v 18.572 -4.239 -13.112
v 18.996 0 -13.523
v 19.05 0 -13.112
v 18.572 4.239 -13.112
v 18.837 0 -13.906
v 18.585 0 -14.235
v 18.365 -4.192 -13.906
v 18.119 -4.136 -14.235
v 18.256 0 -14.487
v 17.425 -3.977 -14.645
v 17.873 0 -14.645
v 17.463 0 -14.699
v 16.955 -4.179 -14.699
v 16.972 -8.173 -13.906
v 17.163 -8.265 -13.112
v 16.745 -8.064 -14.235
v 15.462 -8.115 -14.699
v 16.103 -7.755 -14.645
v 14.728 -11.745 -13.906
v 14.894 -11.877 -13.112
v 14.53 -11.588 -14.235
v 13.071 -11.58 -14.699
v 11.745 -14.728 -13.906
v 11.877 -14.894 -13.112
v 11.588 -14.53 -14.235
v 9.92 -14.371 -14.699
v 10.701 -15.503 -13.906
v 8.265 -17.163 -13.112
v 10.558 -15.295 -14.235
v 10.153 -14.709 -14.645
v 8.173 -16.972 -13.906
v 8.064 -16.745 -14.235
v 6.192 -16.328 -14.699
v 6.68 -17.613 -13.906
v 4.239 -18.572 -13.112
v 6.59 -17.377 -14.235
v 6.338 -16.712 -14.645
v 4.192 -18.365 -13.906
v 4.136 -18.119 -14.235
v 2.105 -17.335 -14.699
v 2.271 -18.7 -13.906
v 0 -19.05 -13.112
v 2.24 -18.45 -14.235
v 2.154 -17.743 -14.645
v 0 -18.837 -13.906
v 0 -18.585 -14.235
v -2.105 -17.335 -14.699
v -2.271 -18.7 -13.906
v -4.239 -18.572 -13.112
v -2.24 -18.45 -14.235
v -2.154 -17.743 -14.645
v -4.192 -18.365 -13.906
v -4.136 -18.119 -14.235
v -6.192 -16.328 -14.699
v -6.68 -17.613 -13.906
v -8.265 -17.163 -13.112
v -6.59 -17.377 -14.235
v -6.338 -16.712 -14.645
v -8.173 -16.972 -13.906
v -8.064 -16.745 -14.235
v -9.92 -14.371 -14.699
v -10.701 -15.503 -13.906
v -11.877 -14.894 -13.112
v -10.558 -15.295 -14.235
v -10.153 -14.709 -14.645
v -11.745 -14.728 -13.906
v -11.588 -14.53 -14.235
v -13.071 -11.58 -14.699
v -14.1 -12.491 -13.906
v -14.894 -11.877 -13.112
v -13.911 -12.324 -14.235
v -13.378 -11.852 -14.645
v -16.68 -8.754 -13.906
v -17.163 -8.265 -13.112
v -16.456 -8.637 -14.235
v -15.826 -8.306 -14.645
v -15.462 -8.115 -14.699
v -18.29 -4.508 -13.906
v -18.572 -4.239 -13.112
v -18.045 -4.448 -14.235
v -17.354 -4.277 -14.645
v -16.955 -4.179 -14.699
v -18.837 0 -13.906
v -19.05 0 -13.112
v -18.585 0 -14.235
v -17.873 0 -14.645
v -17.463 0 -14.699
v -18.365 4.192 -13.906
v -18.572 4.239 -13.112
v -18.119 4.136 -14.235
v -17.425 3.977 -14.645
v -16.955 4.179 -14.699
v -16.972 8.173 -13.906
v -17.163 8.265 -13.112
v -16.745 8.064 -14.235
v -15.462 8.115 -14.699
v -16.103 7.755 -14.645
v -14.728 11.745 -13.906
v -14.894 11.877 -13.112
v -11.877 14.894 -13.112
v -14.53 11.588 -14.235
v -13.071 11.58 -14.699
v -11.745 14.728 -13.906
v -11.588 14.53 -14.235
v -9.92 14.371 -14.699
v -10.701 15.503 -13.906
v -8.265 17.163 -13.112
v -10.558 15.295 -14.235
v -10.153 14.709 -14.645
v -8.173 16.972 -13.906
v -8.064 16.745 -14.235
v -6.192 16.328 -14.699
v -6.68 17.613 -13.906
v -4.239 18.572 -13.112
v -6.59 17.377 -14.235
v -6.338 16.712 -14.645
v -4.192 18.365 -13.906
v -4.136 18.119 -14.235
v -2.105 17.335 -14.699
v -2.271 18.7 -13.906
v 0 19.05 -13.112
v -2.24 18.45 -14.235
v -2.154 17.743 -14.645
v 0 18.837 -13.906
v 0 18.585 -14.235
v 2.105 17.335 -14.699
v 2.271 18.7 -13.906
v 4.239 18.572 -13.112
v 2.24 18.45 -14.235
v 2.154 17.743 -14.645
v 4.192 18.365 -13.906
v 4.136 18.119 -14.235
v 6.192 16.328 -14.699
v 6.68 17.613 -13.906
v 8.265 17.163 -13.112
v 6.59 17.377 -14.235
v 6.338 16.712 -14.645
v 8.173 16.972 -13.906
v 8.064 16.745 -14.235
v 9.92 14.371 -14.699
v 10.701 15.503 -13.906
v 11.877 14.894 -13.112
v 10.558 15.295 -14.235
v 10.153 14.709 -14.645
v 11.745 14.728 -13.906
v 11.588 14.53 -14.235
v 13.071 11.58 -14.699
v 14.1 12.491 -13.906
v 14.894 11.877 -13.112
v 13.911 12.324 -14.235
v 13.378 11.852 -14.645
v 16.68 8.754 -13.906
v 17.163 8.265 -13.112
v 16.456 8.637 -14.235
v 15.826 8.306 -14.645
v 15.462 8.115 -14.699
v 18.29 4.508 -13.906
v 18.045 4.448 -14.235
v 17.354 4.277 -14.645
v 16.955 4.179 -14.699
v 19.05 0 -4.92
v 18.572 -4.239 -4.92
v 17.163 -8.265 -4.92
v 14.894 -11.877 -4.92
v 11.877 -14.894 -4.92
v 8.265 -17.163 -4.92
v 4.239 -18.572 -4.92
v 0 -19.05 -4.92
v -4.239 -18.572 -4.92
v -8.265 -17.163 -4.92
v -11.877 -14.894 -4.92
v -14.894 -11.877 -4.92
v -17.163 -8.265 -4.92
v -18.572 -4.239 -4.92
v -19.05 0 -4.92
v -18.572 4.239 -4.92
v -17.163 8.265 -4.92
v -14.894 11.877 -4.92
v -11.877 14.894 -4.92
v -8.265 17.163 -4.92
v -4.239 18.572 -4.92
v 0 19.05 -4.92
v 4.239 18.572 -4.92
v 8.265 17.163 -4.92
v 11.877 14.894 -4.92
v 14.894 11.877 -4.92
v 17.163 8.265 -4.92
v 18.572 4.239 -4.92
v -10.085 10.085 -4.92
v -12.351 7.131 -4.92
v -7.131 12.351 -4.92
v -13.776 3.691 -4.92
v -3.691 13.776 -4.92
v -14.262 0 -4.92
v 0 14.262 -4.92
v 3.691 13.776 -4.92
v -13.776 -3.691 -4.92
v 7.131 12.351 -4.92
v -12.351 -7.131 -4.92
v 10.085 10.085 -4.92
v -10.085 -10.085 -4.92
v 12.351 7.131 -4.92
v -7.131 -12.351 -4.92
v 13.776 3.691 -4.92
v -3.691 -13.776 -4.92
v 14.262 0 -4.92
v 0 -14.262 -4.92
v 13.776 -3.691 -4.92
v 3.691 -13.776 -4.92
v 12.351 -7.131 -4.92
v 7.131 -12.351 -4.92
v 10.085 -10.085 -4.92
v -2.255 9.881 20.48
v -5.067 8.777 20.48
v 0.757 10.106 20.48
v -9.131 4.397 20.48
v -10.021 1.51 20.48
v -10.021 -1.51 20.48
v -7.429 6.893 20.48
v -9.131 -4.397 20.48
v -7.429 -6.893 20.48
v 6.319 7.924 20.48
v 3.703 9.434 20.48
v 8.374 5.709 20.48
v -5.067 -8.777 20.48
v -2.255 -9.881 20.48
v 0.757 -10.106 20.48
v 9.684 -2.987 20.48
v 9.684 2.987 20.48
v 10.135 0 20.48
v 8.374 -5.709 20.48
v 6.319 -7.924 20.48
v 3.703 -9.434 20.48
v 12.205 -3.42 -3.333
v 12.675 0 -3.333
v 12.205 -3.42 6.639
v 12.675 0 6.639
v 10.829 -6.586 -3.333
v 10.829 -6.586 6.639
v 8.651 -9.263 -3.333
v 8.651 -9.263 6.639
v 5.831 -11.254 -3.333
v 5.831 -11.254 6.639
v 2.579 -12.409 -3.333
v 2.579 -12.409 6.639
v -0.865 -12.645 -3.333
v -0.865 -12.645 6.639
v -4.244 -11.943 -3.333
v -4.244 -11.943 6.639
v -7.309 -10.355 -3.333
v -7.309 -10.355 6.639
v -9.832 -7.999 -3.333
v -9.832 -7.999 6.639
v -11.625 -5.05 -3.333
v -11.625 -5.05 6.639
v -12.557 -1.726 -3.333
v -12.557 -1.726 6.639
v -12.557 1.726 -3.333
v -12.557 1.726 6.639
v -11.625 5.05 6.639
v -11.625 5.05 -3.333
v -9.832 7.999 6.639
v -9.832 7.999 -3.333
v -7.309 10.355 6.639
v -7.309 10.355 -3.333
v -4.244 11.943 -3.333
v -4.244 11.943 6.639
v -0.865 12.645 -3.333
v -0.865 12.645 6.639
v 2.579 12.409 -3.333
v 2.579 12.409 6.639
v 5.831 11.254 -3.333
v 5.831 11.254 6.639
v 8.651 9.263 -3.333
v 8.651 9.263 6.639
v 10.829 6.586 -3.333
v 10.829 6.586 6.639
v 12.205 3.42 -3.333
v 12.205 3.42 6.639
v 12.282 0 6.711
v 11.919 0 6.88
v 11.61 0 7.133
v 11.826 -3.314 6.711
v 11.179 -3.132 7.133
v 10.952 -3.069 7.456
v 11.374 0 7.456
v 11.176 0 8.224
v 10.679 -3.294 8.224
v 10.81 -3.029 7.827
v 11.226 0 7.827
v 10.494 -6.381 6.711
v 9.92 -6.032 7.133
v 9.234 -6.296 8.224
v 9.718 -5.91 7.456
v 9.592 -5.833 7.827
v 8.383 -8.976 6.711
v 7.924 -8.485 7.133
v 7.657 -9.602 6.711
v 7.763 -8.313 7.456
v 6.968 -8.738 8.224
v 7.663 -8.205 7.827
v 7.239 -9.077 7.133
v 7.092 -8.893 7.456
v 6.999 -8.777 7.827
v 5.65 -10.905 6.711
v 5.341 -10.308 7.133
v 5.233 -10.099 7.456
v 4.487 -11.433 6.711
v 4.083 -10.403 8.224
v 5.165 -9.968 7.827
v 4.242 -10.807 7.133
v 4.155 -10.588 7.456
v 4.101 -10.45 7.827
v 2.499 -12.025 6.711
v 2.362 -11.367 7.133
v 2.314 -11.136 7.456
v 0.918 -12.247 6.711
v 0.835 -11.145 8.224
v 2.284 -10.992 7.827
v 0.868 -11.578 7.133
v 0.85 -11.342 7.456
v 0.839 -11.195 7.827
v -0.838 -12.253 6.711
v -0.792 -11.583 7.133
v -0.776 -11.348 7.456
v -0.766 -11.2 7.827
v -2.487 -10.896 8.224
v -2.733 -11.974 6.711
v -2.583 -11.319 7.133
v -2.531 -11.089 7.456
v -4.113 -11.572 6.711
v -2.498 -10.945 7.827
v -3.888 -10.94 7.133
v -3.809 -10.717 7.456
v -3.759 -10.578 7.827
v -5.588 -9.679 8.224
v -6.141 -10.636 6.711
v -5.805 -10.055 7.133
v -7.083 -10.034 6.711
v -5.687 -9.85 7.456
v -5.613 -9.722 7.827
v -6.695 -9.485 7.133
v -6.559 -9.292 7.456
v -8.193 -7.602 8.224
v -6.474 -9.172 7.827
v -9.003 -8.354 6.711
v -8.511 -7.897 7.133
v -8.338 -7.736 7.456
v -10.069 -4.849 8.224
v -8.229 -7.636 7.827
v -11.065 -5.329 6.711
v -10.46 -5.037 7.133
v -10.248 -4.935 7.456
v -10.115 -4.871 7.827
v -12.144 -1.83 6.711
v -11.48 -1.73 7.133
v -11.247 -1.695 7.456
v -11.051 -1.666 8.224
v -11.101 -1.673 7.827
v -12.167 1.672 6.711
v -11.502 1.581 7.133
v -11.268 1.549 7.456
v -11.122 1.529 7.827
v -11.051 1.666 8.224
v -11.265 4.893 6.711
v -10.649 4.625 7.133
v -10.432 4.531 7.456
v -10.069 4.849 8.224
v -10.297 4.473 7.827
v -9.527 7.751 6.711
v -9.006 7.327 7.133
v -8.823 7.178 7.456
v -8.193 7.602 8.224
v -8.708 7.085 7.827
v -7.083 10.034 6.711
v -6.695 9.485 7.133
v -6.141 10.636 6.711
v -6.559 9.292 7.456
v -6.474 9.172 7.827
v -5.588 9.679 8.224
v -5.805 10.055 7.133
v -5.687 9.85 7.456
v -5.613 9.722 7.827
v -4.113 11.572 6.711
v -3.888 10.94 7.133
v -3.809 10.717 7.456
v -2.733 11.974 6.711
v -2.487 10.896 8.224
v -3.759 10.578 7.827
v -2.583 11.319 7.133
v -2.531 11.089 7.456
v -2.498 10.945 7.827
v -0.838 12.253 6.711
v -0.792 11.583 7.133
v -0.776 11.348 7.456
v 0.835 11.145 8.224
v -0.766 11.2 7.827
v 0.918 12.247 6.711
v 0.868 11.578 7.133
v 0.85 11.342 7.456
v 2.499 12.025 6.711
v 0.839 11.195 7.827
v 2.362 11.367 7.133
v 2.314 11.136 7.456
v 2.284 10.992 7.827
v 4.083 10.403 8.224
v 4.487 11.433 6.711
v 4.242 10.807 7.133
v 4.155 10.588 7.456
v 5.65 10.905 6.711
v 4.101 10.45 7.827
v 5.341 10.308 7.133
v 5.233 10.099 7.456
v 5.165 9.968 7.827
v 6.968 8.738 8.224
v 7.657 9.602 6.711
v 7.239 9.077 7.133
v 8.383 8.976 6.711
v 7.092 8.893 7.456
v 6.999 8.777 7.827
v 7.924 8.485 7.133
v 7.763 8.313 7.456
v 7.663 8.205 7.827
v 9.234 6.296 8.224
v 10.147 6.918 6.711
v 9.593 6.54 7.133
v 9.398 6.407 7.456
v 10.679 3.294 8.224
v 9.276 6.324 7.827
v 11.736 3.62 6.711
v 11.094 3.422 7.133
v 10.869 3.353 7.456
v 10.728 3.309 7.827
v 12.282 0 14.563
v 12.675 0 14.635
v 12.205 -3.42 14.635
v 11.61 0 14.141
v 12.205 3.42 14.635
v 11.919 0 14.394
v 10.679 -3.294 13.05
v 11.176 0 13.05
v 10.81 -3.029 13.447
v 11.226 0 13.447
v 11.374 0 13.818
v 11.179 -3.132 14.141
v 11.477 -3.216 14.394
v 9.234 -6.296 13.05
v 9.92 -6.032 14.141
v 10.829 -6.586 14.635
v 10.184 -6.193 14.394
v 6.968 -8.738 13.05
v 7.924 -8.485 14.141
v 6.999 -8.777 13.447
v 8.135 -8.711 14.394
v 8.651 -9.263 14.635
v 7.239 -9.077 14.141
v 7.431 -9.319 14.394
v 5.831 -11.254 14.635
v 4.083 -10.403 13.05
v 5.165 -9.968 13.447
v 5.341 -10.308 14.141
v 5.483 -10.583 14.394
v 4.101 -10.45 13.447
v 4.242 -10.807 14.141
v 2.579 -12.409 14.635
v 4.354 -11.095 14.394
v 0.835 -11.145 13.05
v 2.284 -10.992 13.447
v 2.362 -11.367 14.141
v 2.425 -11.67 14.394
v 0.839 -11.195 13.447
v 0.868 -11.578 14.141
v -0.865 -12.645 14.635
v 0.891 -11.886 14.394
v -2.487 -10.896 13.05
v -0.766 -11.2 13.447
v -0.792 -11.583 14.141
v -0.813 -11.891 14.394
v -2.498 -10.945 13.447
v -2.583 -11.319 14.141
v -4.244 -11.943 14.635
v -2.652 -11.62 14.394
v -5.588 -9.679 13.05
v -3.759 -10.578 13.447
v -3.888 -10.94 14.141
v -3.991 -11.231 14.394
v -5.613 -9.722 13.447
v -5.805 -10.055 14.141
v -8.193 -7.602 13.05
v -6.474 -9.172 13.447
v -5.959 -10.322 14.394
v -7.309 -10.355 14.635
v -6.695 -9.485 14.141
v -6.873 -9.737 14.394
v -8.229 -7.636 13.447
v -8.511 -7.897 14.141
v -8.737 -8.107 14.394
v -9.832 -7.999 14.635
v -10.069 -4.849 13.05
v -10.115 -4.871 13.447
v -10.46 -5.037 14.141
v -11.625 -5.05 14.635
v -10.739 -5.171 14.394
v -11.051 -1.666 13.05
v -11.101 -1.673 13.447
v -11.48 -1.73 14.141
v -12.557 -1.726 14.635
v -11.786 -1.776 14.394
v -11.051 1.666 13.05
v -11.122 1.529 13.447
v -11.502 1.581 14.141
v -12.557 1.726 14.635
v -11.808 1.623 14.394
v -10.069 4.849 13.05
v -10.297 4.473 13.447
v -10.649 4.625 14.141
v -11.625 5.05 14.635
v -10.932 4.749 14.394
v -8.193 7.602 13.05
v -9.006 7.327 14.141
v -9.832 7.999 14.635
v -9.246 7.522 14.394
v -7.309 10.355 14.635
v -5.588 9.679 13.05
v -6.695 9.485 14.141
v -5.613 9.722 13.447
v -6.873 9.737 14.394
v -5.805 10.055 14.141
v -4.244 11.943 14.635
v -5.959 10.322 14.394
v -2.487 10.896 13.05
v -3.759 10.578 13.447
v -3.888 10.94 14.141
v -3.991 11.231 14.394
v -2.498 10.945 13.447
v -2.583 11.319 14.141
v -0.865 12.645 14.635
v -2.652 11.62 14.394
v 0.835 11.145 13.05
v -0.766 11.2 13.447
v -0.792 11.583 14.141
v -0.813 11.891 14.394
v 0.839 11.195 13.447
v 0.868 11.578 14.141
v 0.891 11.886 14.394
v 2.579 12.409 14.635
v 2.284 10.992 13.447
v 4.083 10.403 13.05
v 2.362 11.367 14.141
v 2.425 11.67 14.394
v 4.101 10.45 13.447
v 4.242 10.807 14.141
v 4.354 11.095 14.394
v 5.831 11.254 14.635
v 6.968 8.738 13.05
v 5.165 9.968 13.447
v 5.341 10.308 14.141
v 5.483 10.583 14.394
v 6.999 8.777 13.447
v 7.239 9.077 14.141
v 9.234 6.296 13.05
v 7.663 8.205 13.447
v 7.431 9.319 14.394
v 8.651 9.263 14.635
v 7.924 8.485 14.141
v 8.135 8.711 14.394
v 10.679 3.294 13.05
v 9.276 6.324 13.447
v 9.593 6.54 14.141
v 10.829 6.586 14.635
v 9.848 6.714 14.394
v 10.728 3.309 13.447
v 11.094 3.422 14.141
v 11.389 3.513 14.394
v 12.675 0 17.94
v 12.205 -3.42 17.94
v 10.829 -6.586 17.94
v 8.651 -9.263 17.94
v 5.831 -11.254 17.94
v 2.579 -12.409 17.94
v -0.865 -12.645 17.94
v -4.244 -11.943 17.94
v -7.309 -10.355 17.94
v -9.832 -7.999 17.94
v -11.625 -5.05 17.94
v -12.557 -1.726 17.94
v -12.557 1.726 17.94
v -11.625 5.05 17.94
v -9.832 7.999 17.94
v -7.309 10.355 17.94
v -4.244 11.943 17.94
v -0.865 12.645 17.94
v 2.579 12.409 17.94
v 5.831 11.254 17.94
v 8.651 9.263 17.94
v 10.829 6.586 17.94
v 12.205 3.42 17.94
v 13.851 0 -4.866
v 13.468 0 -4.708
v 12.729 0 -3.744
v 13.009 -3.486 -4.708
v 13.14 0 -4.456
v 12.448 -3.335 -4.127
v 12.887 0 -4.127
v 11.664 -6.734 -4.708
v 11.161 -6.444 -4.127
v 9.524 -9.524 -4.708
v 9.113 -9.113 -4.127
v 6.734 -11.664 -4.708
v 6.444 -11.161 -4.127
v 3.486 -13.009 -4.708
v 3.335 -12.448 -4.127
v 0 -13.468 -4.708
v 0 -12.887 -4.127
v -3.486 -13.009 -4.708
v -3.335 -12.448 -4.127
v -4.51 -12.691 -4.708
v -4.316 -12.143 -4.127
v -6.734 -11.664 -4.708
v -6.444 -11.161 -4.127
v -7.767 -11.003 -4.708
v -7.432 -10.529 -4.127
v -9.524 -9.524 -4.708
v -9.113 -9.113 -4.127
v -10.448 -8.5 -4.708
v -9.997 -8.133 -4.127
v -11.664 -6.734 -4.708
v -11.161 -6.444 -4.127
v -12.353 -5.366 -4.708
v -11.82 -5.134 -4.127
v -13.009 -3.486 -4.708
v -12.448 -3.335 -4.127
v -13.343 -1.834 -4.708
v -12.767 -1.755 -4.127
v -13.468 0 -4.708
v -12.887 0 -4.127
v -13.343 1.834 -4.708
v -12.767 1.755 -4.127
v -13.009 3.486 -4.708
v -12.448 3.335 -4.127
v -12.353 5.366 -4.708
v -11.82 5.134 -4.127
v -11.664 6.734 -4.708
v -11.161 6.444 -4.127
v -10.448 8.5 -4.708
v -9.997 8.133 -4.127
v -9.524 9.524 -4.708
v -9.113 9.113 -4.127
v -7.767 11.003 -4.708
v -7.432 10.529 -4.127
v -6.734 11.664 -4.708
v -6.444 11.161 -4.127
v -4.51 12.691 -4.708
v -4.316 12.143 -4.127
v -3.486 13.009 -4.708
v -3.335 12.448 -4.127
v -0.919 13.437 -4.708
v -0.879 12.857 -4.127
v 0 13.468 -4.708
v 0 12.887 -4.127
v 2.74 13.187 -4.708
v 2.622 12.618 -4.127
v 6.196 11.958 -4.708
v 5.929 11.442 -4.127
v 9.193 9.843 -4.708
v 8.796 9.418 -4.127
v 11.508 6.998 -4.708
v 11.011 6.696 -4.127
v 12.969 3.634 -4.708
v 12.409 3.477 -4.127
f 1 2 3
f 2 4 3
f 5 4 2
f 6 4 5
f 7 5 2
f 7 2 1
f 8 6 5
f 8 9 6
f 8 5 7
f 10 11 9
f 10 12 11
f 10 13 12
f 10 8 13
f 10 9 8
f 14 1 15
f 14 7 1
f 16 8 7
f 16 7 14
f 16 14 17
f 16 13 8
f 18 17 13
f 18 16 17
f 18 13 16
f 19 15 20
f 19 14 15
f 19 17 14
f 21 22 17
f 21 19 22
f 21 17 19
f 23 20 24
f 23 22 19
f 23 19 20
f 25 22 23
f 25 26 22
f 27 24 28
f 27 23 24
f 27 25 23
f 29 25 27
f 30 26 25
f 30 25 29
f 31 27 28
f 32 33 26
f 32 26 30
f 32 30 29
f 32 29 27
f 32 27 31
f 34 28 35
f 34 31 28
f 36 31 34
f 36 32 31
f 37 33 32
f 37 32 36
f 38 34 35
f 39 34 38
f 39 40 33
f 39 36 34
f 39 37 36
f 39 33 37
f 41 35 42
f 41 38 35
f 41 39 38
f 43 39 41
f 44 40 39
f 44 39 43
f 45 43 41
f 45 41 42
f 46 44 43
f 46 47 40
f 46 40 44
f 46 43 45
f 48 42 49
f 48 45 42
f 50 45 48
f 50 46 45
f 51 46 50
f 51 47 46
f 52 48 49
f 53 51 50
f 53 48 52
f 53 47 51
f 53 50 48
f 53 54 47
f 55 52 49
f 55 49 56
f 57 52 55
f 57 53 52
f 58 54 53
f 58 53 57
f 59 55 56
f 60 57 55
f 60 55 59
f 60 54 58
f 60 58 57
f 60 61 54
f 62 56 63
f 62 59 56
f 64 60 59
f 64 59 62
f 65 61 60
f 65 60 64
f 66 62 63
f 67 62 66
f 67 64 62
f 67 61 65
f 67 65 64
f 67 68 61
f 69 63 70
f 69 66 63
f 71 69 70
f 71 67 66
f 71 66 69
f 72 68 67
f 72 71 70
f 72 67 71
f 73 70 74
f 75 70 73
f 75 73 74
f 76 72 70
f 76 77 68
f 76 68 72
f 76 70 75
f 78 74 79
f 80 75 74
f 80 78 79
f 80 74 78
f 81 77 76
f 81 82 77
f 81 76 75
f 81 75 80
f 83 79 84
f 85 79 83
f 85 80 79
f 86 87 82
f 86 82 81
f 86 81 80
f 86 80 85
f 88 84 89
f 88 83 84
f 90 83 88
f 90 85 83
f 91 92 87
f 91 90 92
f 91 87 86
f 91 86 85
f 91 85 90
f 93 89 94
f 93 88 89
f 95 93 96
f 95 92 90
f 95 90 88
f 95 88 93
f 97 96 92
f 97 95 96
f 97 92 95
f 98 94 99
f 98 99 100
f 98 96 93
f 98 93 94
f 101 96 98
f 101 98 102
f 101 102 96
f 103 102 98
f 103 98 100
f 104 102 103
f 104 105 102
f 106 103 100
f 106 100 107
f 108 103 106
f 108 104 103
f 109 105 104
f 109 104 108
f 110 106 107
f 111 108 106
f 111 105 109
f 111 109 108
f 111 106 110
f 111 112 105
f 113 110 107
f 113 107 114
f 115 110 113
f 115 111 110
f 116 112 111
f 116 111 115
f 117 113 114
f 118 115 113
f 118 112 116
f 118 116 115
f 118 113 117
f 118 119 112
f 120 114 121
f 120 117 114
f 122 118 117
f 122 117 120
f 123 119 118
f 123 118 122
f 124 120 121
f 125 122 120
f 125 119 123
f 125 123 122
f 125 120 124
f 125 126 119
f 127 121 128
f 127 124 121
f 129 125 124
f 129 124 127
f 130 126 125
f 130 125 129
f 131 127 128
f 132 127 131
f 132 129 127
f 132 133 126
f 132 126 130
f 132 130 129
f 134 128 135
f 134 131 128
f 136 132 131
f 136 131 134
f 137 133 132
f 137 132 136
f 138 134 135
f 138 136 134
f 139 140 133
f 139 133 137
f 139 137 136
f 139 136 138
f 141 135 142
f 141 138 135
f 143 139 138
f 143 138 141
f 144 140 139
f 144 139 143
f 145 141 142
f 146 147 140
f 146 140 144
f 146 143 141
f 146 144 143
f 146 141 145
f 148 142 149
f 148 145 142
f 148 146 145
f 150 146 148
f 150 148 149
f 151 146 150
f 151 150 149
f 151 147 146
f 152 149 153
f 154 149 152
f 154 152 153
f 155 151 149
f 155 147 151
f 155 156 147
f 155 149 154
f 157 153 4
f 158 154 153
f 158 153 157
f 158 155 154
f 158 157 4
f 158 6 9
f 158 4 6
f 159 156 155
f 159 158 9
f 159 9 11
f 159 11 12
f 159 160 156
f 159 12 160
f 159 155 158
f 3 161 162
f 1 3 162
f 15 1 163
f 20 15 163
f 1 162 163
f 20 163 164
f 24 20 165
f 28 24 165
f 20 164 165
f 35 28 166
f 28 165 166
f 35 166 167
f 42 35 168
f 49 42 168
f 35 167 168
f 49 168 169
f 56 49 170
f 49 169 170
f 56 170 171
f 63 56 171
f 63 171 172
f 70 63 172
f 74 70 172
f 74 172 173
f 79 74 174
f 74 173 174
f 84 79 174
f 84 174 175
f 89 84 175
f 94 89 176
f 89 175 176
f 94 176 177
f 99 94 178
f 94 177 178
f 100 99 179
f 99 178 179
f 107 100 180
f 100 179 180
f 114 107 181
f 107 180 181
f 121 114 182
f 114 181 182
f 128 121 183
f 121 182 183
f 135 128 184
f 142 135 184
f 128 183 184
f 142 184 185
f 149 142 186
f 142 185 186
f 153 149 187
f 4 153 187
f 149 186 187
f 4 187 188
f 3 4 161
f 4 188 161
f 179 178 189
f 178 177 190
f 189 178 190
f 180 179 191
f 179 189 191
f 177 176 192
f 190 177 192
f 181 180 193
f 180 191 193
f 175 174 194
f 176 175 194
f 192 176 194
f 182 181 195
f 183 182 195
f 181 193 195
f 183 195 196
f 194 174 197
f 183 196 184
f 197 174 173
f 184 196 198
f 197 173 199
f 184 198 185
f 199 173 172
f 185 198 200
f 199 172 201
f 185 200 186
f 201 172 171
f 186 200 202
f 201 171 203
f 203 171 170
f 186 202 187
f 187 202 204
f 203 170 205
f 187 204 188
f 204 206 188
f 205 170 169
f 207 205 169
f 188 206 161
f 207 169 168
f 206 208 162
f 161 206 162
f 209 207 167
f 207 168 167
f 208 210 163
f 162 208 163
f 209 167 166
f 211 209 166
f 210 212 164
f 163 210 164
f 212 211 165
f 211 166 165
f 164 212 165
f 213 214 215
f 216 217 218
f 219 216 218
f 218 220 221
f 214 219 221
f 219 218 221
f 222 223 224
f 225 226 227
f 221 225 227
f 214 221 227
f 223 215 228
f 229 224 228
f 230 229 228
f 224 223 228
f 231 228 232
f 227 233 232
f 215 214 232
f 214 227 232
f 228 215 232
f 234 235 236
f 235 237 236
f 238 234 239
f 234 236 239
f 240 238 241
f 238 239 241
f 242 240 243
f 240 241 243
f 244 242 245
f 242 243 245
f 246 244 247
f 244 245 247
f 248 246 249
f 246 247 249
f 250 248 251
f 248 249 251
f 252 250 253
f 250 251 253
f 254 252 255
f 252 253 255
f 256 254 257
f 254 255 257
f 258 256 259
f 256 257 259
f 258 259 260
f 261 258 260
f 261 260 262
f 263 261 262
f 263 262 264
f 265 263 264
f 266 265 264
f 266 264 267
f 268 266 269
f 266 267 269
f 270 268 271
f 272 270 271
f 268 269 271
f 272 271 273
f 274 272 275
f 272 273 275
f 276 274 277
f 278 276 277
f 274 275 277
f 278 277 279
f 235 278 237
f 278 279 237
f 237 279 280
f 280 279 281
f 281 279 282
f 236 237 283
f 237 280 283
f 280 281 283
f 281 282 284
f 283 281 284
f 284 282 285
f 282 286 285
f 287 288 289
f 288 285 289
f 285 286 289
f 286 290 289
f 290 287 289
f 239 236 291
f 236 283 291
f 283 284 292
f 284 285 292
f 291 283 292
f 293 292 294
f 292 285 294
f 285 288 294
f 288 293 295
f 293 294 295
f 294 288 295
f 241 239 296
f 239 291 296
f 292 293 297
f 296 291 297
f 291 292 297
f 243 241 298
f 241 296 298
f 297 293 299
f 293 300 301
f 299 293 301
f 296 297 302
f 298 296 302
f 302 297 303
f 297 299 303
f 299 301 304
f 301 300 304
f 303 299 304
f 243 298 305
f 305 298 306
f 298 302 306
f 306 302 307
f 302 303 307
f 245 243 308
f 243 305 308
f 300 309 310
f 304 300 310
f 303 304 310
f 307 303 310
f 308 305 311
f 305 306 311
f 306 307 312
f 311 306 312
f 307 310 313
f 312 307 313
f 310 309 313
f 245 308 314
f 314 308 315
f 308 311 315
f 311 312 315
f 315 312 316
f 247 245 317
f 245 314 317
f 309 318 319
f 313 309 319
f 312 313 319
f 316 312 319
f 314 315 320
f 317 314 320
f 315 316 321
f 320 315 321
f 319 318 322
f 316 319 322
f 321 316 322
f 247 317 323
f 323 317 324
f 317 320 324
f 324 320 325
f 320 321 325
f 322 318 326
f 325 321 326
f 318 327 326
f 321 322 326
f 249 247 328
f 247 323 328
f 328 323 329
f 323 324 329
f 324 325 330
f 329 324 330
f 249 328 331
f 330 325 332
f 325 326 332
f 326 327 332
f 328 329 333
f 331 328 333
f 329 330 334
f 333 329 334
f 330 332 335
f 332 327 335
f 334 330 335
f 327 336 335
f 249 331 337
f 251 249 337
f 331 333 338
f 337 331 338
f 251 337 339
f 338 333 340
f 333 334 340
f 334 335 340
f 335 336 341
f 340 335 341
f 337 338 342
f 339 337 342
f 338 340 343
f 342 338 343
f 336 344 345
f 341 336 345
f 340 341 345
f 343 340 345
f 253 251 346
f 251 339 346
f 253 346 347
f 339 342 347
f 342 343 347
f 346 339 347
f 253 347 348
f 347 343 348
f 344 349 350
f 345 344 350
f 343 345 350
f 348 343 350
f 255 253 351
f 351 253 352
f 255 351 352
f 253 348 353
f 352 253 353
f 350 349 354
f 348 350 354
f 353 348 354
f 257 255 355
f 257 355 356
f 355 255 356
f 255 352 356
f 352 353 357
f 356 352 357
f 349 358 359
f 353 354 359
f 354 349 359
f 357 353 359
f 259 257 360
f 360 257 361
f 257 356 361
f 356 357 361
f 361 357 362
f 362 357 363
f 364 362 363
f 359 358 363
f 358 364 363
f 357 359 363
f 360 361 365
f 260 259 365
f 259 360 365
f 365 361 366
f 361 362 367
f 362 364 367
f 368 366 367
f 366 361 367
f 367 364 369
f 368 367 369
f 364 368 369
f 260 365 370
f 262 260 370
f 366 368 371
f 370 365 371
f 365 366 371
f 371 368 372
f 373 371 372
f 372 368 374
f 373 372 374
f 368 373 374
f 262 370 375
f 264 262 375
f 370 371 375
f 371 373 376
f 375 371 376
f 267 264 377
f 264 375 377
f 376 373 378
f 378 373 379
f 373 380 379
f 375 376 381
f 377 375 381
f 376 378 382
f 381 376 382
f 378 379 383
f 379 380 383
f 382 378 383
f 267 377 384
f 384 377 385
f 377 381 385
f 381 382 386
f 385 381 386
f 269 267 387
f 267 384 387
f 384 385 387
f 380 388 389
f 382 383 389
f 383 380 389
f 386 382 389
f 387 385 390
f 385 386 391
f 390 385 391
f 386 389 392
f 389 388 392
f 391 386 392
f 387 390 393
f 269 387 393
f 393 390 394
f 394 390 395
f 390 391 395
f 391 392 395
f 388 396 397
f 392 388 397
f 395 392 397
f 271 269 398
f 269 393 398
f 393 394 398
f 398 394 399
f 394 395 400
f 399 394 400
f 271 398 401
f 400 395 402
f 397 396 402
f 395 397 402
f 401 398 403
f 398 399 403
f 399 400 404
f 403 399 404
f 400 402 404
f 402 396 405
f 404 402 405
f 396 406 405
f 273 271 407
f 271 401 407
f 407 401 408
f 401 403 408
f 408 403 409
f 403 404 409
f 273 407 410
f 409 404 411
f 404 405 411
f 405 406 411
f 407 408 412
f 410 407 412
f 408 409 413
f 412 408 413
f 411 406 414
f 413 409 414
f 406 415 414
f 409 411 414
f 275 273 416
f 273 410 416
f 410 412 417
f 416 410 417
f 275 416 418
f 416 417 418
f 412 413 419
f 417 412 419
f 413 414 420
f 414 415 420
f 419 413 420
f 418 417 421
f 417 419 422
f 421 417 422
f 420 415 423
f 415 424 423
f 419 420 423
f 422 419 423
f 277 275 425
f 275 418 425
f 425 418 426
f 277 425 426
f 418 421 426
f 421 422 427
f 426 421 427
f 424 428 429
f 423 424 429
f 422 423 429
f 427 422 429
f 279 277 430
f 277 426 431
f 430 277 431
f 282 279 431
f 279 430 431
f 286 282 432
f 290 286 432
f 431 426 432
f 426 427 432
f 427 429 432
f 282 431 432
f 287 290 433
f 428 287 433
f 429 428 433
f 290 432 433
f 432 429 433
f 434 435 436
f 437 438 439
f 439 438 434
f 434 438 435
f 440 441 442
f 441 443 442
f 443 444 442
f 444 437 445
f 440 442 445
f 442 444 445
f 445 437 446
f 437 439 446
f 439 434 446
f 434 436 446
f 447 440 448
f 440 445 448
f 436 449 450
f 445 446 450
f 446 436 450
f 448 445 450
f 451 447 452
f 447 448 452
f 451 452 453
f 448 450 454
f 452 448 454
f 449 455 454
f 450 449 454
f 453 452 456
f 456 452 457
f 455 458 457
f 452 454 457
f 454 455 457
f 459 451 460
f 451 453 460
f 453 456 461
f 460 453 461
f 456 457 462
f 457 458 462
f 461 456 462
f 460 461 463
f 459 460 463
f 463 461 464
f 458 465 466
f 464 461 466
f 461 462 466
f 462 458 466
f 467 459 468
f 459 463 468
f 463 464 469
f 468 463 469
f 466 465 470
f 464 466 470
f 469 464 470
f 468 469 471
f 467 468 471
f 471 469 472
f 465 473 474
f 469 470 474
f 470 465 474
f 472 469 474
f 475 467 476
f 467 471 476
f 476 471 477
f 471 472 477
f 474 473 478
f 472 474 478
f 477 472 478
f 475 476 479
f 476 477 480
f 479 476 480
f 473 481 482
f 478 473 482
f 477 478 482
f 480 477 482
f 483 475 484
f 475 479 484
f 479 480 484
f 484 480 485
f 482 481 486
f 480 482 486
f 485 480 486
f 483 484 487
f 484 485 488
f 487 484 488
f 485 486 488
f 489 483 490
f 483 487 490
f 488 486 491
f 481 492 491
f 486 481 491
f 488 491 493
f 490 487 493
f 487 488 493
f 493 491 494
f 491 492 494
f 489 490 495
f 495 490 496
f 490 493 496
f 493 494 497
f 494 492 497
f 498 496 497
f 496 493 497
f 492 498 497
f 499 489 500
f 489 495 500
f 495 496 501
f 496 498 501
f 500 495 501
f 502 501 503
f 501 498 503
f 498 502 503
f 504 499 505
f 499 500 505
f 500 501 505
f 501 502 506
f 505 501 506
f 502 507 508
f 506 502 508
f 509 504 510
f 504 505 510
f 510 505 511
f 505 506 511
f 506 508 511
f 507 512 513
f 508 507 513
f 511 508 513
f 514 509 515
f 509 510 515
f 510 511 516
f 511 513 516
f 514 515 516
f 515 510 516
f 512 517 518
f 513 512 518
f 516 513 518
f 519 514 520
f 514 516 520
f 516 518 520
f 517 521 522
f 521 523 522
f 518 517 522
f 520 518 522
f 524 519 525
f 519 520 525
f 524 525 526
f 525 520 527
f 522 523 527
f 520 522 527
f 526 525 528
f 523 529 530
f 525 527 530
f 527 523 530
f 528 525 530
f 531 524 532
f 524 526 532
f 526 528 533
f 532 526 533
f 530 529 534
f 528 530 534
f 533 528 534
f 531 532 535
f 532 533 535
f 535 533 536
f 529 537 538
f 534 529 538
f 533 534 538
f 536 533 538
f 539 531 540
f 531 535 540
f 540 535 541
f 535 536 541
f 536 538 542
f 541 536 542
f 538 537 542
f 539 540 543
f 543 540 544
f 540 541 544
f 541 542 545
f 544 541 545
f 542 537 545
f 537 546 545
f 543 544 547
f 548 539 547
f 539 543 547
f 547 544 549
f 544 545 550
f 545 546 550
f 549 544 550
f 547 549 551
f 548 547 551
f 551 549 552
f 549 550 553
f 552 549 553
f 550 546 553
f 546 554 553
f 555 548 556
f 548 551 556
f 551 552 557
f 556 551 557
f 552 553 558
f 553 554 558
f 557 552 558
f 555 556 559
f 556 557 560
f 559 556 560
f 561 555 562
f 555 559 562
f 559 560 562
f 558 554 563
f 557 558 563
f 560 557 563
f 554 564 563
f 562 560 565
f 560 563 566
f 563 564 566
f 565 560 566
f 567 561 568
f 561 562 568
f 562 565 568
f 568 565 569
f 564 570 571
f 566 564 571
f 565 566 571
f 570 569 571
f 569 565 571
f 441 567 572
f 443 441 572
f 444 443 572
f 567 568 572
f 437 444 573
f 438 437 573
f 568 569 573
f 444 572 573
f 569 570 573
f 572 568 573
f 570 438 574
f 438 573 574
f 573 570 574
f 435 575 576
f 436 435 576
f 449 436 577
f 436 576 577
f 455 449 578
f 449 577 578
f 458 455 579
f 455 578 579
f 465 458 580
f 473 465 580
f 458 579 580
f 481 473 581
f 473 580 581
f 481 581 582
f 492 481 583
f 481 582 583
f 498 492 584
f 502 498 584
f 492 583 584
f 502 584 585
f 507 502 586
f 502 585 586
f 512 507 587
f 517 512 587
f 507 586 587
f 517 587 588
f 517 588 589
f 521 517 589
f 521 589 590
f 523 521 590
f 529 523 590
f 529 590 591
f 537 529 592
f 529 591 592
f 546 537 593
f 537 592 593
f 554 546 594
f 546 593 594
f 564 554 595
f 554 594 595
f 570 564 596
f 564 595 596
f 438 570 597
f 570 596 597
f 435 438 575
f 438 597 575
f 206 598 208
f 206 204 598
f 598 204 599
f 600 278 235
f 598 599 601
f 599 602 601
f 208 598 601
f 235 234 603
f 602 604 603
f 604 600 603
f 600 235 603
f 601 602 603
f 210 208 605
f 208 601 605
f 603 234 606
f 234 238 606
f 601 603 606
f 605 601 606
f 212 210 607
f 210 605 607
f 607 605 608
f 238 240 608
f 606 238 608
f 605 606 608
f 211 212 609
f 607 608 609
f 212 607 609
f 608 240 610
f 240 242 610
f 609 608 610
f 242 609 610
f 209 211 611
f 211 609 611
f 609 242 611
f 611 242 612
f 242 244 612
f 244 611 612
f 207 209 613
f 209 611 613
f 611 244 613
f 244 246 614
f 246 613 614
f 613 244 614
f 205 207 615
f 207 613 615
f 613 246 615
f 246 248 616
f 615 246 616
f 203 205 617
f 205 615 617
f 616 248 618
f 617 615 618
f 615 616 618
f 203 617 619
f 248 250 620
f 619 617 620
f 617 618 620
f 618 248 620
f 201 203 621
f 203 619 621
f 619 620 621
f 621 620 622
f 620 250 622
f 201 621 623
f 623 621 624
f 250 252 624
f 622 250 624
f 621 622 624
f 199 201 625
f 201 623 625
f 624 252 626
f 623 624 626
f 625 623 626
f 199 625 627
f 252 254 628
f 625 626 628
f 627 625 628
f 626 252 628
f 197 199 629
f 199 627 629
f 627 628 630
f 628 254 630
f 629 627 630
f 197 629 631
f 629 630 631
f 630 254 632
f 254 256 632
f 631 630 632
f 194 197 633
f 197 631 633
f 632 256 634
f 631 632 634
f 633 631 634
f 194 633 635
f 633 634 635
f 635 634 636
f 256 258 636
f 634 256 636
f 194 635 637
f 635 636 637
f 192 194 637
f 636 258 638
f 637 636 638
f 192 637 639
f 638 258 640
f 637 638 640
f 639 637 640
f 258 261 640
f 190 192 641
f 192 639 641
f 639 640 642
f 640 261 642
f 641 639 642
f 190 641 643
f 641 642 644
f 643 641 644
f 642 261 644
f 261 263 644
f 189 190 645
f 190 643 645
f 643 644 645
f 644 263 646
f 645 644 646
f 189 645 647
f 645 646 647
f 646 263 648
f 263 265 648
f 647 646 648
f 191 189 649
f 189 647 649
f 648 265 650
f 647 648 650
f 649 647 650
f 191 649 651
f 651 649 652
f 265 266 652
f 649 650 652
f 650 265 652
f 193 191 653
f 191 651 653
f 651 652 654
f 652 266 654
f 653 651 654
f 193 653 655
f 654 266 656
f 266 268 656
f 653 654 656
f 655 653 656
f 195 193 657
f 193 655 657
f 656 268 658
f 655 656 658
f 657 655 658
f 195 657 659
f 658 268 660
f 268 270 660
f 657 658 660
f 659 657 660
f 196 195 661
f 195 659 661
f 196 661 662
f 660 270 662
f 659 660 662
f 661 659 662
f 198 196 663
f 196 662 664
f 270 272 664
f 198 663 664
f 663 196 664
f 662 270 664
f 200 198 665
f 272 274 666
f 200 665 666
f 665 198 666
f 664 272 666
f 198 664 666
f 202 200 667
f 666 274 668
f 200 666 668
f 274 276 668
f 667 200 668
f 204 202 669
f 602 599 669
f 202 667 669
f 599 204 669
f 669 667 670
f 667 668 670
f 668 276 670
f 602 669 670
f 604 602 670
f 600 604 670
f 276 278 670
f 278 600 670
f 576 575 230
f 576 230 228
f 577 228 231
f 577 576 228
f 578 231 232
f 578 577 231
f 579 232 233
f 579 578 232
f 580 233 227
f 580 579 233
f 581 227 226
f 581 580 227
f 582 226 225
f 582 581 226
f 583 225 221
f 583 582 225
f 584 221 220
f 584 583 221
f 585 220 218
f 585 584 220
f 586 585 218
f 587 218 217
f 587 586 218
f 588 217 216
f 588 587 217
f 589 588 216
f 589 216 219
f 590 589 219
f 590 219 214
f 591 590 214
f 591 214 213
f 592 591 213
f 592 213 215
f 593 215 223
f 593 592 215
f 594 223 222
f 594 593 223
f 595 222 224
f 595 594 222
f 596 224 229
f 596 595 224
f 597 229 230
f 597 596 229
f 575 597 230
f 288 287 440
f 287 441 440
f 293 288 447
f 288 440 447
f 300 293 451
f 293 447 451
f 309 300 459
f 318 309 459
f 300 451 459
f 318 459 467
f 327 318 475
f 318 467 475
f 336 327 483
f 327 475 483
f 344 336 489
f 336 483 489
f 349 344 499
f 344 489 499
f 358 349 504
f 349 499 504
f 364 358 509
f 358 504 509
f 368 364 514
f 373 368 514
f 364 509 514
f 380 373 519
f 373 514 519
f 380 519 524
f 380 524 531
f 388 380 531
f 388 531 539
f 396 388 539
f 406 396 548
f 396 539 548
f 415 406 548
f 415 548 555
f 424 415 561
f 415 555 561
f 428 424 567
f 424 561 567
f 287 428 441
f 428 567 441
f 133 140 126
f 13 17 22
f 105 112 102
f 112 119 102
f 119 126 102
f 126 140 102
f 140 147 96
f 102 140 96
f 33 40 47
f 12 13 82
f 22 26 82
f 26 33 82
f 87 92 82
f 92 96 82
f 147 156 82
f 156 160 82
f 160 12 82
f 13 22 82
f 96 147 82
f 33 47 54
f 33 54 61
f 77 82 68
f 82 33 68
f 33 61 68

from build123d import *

# Parameters (mm, degrees)
F2_SIZE = 2.54
F3_R    = 1.5875


with BuildPart() as f1:
    # F0 (on Front) → F1 (revolve)
    with BuildSketch(Plane.XZ):
        with BuildLine():
            Line((12.6746, 20.479507), (0, 20.479507))
            Line((0, 20.479507), (0, -14.699493))
            Line((0, -14.699493), (19.05, -14.699493))
            Line((19.05, -14.699493), (19.05, -4.920493))
            Line((19.05, -4.920493), (14.2621, -4.920493))
            ThreePointArc((14.2621, -4.920493), (13.139568, -4.455525), (12.6746, -3.332993))
            Line((12.6746, -3.332993), (12.6746, 6.636507))
            Line((12.6746, 6.636507), (12.6746, 6.638998))
            ThreePointArc((12.6746, 6.638998), (11.609965, 7.133359), (11.176, 8.224007))
            Line((11.176, 8.224007), (11.176, 13.050007))
            ThreePointArc((11.176, 13.050007), (11.609965, 14.140656), (12.6746, 14.635016))
            Line((12.6746, 14.635016), (12.6746, 14.637507))
            Line((12.6746, 14.637507), (12.6746, 20.479507))
        make_face()
    revolve(axis=Axis((0, 0, 2.082966), (0, 0, -1)))

    # F2
    f2_edges = [f1.edges().sort_by_distance(p)[0] for p in [
        (-12.6746, 0, 20.479507),
    ]]
    chamfer(f2_edges, length=F2_SIZE)

    # F3
    f3_edges = [f1.edges().sort_by_distance(p)[0] for p in [
        (-19.05, 0, -14.699493),
    ]]
    fillet(f3_edges, radius=F3_R)


solid = f1.part
